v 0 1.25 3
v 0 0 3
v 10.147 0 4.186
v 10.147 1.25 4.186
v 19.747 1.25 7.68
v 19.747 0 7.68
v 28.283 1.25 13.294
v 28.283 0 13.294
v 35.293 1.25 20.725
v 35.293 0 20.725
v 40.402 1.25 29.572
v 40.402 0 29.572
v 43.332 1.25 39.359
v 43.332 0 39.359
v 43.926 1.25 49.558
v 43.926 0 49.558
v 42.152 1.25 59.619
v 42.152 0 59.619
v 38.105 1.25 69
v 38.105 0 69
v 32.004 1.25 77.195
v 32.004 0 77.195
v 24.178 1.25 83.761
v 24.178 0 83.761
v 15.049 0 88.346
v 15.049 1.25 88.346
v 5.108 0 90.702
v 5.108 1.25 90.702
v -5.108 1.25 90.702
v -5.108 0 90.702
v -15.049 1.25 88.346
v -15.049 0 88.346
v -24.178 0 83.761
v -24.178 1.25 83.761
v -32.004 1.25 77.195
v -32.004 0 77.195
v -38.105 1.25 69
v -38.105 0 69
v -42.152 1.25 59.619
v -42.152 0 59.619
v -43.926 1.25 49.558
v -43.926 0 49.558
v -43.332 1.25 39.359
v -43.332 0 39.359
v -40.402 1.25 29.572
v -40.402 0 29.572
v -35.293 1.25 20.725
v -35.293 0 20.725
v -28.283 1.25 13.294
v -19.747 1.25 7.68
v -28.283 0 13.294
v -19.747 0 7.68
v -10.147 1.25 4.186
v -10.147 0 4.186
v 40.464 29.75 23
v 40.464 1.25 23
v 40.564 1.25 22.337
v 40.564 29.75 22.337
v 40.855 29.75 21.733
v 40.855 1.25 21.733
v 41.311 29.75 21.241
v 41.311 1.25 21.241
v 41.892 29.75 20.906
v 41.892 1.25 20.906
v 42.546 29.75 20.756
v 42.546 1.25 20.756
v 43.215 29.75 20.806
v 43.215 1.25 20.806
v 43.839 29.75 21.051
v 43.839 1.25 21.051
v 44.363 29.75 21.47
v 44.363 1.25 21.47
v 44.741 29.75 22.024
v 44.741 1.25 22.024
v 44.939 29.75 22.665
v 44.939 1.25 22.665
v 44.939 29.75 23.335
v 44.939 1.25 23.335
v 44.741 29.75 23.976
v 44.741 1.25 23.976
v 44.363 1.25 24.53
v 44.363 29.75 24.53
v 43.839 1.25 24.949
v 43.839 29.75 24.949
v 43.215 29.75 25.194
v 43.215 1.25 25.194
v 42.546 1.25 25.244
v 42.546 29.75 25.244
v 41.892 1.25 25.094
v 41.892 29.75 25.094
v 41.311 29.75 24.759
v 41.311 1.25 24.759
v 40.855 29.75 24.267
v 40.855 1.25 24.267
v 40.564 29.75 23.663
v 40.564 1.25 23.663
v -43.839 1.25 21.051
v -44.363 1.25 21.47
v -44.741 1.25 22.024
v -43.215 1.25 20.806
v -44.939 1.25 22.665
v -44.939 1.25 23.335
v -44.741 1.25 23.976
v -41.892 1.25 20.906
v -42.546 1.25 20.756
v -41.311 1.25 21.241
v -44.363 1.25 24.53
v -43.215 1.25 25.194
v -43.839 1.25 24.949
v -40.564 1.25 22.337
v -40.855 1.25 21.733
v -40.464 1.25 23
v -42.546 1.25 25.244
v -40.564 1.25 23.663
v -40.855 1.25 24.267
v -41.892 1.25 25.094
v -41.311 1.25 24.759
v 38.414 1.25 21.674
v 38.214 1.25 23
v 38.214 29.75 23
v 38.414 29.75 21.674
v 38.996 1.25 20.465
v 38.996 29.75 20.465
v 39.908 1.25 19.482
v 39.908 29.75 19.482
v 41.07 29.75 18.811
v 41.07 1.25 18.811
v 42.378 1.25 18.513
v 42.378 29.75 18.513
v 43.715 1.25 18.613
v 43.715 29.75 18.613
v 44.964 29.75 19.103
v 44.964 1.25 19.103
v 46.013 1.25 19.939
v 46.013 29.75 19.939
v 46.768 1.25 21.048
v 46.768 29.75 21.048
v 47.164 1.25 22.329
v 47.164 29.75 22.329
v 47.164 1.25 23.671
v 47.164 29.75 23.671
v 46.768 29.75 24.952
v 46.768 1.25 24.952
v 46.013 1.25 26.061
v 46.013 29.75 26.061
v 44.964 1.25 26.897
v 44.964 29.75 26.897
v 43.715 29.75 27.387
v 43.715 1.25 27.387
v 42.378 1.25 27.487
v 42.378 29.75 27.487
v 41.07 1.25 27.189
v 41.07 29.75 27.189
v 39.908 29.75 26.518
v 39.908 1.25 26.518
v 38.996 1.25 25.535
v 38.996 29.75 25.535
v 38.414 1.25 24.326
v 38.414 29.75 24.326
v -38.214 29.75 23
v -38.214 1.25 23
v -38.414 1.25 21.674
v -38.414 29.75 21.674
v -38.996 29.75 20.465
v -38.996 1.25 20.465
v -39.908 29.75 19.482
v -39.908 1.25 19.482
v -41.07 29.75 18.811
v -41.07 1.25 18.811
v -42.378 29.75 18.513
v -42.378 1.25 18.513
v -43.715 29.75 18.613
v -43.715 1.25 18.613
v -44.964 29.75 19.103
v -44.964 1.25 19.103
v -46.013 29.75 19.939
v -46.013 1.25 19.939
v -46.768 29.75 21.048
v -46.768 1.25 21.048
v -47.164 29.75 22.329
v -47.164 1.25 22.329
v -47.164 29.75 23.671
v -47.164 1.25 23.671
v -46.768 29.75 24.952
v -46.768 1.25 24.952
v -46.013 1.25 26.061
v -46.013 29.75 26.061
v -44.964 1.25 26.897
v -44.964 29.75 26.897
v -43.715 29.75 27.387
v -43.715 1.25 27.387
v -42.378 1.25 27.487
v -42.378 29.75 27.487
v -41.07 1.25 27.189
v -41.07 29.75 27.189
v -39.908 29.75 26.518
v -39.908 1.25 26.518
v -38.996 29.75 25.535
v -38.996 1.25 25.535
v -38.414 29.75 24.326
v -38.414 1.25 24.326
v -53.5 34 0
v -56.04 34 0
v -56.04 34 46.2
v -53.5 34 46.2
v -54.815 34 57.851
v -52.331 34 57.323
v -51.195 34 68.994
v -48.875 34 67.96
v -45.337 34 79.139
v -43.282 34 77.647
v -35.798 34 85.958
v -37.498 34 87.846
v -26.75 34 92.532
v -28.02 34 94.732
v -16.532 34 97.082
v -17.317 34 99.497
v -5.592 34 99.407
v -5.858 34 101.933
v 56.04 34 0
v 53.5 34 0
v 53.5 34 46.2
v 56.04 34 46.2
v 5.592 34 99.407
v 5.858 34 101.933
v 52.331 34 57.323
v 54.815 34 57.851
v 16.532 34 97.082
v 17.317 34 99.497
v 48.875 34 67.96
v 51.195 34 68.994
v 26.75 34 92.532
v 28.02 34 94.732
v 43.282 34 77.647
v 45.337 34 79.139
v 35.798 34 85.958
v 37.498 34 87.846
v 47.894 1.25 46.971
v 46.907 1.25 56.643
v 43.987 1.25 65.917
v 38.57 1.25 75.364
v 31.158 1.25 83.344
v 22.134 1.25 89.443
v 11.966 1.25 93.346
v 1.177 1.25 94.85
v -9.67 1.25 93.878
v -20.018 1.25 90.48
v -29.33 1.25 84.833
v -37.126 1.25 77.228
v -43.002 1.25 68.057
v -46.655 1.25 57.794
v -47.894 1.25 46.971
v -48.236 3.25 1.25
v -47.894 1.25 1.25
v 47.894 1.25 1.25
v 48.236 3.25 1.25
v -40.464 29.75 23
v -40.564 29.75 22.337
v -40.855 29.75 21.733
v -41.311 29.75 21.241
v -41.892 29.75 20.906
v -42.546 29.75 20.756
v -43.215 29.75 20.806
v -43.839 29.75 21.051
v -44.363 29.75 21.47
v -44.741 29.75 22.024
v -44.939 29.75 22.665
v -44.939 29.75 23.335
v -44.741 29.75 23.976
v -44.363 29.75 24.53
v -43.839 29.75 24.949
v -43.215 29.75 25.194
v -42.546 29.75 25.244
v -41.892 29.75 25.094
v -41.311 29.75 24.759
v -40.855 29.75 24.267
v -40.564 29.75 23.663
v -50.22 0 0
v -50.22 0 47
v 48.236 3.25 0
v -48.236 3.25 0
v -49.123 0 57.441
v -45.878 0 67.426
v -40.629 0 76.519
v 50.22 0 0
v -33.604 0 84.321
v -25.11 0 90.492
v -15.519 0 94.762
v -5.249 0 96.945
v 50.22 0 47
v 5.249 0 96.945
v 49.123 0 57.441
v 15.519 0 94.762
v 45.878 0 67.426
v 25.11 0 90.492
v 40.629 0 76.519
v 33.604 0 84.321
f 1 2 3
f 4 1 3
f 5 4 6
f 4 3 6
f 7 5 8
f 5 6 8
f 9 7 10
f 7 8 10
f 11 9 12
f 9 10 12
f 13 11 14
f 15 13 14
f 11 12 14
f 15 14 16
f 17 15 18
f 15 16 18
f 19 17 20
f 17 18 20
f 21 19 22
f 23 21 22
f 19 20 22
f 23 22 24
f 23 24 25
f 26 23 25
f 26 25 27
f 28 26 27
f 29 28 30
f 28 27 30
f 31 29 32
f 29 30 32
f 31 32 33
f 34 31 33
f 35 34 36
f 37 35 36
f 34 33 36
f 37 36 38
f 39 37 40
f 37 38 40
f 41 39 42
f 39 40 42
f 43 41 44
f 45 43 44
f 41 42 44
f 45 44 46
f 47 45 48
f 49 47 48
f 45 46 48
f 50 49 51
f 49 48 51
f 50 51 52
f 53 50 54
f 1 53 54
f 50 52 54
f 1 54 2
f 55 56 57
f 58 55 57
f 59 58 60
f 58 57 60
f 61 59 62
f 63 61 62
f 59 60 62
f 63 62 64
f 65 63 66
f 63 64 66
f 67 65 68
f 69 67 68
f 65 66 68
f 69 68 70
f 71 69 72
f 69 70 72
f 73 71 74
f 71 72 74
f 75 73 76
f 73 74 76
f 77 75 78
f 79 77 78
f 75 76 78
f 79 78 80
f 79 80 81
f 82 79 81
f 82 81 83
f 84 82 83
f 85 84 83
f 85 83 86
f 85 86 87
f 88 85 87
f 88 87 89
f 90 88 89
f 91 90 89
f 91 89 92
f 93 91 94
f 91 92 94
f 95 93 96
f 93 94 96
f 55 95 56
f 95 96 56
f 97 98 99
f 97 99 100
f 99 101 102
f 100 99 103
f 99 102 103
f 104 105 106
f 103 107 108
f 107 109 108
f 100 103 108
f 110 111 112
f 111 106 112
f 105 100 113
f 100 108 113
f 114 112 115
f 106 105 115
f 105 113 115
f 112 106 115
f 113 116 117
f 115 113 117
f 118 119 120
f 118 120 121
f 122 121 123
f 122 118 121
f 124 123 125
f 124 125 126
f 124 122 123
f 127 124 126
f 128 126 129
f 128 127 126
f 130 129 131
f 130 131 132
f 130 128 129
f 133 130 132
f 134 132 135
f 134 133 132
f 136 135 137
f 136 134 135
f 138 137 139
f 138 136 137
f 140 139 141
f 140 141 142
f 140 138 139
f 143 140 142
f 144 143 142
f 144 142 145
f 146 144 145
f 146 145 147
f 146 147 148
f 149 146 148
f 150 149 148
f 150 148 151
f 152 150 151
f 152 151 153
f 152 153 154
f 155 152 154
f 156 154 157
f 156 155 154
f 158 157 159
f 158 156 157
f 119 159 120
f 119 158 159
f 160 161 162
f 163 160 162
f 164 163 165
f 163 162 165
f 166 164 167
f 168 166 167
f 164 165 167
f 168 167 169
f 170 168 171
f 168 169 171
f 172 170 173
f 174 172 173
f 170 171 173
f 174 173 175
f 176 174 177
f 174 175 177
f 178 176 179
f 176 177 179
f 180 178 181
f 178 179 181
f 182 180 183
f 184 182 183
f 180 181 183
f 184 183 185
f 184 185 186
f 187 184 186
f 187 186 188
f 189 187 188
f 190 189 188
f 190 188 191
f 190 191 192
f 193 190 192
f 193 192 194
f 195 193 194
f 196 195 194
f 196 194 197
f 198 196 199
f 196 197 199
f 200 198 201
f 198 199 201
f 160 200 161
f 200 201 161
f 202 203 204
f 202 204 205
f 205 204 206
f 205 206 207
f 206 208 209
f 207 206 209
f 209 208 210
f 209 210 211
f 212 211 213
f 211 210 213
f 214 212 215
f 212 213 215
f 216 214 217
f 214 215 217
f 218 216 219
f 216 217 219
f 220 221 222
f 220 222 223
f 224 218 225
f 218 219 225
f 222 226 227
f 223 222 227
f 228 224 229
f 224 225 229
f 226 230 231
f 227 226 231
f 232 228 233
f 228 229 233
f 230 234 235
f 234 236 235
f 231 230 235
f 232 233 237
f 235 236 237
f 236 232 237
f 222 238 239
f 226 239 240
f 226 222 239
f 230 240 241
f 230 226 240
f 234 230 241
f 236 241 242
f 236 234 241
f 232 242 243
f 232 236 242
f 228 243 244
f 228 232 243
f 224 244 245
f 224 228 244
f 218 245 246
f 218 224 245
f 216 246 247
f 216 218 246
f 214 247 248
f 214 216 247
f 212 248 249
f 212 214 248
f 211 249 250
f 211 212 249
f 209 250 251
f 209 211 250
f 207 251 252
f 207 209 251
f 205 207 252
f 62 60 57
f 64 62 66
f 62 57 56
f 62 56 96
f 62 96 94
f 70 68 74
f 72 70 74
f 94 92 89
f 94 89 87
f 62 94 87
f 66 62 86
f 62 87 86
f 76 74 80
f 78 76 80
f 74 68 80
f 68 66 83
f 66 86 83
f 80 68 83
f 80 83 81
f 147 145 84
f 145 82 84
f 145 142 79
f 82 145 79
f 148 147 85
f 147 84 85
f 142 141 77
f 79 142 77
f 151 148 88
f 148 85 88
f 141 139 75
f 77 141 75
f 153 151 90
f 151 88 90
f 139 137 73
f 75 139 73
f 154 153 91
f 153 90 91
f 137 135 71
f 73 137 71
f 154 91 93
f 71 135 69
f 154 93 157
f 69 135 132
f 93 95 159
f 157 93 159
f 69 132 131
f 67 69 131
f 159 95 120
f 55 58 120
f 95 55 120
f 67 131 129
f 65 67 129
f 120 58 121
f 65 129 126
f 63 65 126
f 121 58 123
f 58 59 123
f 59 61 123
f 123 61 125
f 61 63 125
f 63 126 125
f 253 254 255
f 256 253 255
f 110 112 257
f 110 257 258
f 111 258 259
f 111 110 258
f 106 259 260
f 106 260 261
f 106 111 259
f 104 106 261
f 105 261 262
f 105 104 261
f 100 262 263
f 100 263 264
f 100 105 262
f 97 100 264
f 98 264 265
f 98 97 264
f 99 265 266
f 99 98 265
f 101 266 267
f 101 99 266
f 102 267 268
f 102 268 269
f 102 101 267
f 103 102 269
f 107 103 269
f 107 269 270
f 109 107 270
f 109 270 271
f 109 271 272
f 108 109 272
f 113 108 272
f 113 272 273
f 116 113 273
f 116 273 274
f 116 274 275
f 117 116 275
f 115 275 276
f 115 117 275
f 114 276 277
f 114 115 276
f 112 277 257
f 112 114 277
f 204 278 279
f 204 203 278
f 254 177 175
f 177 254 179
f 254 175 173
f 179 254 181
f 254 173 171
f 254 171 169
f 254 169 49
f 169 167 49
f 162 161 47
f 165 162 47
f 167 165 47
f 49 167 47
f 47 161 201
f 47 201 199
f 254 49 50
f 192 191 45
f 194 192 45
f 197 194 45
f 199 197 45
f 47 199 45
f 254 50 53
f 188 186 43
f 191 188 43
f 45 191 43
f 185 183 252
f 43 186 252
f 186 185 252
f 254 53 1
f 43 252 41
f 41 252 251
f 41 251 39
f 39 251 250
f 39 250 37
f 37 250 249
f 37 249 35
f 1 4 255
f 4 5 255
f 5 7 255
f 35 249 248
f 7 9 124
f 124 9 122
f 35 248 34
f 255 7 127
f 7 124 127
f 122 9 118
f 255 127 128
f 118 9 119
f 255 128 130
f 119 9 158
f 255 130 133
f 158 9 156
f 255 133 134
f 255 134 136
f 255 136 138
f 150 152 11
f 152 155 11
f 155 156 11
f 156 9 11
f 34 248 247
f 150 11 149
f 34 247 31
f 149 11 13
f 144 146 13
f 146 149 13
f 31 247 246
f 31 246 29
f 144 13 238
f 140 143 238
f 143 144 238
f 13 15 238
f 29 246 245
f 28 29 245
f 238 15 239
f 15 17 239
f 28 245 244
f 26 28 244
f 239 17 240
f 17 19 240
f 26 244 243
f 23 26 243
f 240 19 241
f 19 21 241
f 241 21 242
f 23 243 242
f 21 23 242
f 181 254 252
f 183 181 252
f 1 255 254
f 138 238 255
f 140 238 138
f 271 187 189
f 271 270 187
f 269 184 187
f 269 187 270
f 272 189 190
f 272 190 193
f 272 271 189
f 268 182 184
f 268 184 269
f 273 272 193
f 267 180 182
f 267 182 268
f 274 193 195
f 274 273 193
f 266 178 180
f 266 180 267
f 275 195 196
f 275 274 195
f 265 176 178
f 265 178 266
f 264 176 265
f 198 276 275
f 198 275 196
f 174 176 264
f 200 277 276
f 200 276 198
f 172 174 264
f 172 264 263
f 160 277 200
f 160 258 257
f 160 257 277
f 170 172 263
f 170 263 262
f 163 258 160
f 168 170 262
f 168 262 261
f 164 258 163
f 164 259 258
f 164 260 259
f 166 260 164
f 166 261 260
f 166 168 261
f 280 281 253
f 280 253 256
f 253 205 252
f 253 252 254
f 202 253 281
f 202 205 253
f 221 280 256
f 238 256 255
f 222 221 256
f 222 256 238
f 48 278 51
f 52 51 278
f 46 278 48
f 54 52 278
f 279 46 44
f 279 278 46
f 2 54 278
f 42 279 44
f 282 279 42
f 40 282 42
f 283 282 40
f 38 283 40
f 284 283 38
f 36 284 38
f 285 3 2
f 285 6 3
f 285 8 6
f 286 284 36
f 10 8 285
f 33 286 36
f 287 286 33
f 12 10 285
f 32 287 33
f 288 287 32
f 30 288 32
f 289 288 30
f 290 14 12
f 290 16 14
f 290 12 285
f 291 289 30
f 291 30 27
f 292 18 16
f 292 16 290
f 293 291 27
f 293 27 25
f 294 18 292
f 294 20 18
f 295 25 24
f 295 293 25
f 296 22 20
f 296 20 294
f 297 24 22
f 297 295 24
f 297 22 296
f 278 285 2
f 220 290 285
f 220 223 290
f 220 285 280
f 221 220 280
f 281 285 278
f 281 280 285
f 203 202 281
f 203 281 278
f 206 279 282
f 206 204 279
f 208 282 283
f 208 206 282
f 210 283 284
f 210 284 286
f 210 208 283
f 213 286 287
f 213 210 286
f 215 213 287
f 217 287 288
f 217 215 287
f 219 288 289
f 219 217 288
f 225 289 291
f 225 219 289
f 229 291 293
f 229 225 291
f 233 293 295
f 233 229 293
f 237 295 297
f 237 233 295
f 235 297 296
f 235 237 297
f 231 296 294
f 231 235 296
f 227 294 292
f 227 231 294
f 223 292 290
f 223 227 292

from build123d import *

# Parameters (mm, degrees)
SKETCH3_R                 = 44
BOSS_EXTRUDE1_DEPTH       = 1.25
SKETCH4_W                 = 100.44
SKETCH4_H                 = 1.25
BOSS_EXTRUDE2_DEPTH       = 2
BOSS_EXTRUDE3_OUTLINE_R   = 4.5
BOSS_EXTRUDE3_OUTLINE_R_2 = 2.25
BOSS_EXTRUDE3_DEPTH       = 28.5


with BuildPart() as part:
    # Sketch1 → Loft1 section 0
    with BuildSketch(Plane(origin=(0, 0, 0), x_dir=(1, 0, 0), z_dir=(0, 1, 0))):
        with BuildLine():
            Line((47.68, 0), (47.68, -47))
            ThreePointArc((47.68, -47), (0, -94.68), (-47.68, -47))
            Line((-47.68, -47), (-47.68, 0))
            Line((-47.68, 0), (-50.22, 0))
            Line((-50.22, 0), (-50.22, -47))
            ThreePointArc((-50.22, -47), (0, -97.22), (50.22, -47))
            Line((50.22, -47), (50.22, 0))
            Line((50.22, 0), (47.68, 0))
        make_face()
    # Sketch2 → Loft1 section 1
    with BuildSketch(Plane(origin=(0, 34, 0), x_dir=(1, 0, 0), z_dir=(0, 1, 0))):
        with BuildLine():
            Line((-56.04, 0), (-56.04, -46.2))
            ThreePointArc((-56.04, -46.2), (0, -102.24), (56.04, -46.2))
            Line((56.04, -46.2), (56.04, 0))
            Line((56.04, 0), (53.5, 0))
            Line((53.5, 0), (53.5, -46.2))
            ThreePointArc((53.5, -46.2), (0, -99.7), (-53.5, -46.2))
            Line((-53.5, -46.2), (-53.5, 0))
            Line((-53.5, 0), (-56.04, 0))
        make_face()
    loft()

    # Sketch3 → Boss-Extrude1 (add)
    with BuildSketch(Plane.XZ):
        with BuildLine():
            Line((-50.219775987, 0), (50.219775987, 0))
            Line((50.219775987, 0), (50.219775987, 46.850000669))
            ThreePointArc((50.219775987, 46.850000669), (0, 96.920001338), (-50.219775987, 46.850000669))
            Line((-50.219775987, 46.850000669), (-50.219775987, 0))
        make_face()
        with Locations(Location((0, 47, 0), (0, 0, 270))):
            Circle(SKETCH3_R, mode=Mode.SUBTRACT)
    extrude(amount=-BOSS_EXTRUDE1_DEPTH)

    # Sketch4 → Boss-Extrude2 (add)
    with BuildSketch(Plane(origin=(0, 1.25, 0), x_dir=(1, 0, 0), z_dir=(0, 1, 0))):
        with Locations((0, -0.625)):
            Rectangle(SKETCH4_W, SKETCH4_H)
    extrude(amount=BOSS_EXTRUDE2_DEPTH)

    # Boss-Extrude3: read off the stored shape, not the designer's step
    # Boss-Extrude3 outline → Boss-Extrude3 (add)
    with BuildSketch(Plane(origin=(0, 1.25, 0), x_dir=(1, 0, 0), z_dir=(0, 1, 0))):
        with Locations((-42.713936364, -23)):
            Circle(BOSS_EXTRUDE3_OUTLINE_R)
        with Locations((-42.713936364, -23)):
            Circle(BOSS_EXTRUDE3_OUTLINE_R_2, mode=Mode.SUBTRACT)
    boss_extrude3 = extrude(amount=BOSS_EXTRUDE3_DEPTH)

    # Mirror1: Boss-Extrude3 across plane
    add(boss_extrude3.mirror(Plane(origin=(0, 0, 0), x_dir=(0, 0, 1), z_dir=(1, 0, 0))))


solid = part.part
